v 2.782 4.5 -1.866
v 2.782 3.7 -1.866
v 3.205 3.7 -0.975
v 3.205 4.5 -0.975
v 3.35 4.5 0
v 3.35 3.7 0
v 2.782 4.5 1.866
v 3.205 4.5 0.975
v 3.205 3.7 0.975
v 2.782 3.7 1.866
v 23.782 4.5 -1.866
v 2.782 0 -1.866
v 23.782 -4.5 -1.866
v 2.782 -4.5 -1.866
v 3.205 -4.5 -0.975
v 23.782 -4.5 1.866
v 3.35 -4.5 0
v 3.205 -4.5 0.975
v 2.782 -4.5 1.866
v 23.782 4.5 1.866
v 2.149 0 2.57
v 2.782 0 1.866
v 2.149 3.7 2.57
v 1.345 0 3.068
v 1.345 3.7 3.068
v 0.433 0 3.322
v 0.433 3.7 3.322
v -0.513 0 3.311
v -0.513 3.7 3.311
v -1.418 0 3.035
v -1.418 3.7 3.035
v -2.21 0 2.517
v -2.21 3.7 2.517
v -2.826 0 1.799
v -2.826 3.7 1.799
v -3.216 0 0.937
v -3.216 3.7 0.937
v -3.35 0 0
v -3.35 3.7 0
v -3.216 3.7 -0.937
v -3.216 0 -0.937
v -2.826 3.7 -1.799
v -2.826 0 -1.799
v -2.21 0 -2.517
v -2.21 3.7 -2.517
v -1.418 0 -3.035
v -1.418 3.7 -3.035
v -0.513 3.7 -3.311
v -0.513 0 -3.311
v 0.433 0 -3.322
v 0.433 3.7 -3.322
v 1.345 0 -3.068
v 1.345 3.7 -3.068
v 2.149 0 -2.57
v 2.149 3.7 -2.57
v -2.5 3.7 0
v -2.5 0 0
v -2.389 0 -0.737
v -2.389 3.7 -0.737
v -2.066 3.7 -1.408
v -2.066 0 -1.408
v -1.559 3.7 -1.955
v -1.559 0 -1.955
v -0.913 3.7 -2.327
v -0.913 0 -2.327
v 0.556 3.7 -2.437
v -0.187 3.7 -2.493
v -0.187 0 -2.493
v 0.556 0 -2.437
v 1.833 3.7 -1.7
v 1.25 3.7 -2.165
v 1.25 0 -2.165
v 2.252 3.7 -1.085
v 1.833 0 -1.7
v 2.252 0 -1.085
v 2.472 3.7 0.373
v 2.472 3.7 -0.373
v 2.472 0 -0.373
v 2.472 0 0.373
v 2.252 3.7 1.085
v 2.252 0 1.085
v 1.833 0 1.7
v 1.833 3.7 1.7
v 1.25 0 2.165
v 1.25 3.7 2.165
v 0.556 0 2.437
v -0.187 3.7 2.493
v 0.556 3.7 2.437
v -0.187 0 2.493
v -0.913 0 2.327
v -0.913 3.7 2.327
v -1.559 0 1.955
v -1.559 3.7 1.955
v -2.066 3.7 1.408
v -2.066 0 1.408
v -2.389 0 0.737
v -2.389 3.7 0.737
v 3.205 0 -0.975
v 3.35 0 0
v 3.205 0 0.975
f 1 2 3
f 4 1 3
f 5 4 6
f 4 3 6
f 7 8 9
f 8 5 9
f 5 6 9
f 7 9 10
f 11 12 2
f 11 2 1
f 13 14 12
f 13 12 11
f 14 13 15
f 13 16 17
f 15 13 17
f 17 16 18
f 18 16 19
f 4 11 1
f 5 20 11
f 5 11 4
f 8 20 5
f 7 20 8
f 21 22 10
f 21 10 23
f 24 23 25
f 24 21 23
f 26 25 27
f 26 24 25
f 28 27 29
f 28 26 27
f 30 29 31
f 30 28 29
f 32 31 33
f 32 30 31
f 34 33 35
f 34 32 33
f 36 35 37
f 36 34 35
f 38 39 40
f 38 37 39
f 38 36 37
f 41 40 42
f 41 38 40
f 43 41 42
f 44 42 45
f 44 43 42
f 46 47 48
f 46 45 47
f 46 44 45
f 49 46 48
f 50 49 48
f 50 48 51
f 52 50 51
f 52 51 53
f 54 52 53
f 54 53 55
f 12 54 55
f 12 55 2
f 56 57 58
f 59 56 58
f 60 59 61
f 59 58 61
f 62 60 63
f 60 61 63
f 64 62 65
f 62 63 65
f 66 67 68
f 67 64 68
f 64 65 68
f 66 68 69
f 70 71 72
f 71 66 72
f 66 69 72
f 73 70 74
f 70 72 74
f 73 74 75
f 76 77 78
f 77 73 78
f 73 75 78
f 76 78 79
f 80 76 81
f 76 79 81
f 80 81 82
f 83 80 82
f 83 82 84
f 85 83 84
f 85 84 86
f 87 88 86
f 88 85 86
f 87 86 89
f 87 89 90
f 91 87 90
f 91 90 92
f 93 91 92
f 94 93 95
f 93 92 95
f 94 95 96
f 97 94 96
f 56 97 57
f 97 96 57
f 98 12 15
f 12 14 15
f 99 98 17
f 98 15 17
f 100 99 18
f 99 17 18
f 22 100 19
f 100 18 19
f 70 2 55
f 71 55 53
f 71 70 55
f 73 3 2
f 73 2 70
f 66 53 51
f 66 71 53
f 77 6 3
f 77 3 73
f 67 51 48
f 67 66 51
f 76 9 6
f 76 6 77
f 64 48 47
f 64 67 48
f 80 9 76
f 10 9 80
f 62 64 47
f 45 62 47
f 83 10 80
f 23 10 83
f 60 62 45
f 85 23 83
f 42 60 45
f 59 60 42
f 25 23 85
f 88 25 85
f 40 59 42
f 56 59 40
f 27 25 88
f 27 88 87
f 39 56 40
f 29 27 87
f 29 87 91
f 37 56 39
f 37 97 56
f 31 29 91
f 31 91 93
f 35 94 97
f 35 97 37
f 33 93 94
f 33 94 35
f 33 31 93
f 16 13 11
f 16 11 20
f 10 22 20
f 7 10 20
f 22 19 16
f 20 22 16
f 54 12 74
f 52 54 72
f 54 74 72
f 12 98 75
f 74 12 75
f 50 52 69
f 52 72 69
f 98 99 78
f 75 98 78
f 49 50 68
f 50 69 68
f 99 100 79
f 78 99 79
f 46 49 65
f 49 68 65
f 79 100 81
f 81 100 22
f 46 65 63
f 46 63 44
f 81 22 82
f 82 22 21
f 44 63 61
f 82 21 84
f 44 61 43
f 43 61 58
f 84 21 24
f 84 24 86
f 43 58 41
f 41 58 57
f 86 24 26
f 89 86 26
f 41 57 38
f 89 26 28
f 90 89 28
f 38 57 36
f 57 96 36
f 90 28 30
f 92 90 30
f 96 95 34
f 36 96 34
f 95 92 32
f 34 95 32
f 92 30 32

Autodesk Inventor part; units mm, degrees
ref_plane "YZ Plane" through (0, 0, 0) normal (1, 0, 0) x (0, 1, 0)
ref_plane "XZ Plane" through (0, 0, 0) normal (0, 1, 0) x (-1, 0, 0)
ref_plane "XY Plane" through (0, 0, 0) normal (0, 0, 1) x (1, 0, 0)
sketch "Sketch1" plane through (0, 0, 0) normal (0, 1, 0) x (-1, 0, 0)
  circle A0 centre (0, 0) radius 2.5
  circle A1 centre (0, 0) radius 3.35
  line L0 (-3.35, 0) -> (-15.85, 0) construction
  line L1 (-2.7822, 1.866) -> (-23.7822, 1.866)
  line L2 (-2.7822, -1.866) -> (-23.7822, -1.866)
  line L3 (-23.7822, -1.866) -> (-23.7822, 1.866)
  point P0 (0.2218, 3.3427)
  point P1 (0.2218, -3.3427)
  dimension "d0" = 5
  dimension "d1" = 6.7
  dimension "d2" = 12.5
  dimension "d12" = 21
extrude "Extrusion1" add sketch "Sketch1" along normal blind 3.7 contours A1
extrude "Extrusion3" add sketch "Sketch1" along normal mid plane 9 contours A1 L2 L3 L1
